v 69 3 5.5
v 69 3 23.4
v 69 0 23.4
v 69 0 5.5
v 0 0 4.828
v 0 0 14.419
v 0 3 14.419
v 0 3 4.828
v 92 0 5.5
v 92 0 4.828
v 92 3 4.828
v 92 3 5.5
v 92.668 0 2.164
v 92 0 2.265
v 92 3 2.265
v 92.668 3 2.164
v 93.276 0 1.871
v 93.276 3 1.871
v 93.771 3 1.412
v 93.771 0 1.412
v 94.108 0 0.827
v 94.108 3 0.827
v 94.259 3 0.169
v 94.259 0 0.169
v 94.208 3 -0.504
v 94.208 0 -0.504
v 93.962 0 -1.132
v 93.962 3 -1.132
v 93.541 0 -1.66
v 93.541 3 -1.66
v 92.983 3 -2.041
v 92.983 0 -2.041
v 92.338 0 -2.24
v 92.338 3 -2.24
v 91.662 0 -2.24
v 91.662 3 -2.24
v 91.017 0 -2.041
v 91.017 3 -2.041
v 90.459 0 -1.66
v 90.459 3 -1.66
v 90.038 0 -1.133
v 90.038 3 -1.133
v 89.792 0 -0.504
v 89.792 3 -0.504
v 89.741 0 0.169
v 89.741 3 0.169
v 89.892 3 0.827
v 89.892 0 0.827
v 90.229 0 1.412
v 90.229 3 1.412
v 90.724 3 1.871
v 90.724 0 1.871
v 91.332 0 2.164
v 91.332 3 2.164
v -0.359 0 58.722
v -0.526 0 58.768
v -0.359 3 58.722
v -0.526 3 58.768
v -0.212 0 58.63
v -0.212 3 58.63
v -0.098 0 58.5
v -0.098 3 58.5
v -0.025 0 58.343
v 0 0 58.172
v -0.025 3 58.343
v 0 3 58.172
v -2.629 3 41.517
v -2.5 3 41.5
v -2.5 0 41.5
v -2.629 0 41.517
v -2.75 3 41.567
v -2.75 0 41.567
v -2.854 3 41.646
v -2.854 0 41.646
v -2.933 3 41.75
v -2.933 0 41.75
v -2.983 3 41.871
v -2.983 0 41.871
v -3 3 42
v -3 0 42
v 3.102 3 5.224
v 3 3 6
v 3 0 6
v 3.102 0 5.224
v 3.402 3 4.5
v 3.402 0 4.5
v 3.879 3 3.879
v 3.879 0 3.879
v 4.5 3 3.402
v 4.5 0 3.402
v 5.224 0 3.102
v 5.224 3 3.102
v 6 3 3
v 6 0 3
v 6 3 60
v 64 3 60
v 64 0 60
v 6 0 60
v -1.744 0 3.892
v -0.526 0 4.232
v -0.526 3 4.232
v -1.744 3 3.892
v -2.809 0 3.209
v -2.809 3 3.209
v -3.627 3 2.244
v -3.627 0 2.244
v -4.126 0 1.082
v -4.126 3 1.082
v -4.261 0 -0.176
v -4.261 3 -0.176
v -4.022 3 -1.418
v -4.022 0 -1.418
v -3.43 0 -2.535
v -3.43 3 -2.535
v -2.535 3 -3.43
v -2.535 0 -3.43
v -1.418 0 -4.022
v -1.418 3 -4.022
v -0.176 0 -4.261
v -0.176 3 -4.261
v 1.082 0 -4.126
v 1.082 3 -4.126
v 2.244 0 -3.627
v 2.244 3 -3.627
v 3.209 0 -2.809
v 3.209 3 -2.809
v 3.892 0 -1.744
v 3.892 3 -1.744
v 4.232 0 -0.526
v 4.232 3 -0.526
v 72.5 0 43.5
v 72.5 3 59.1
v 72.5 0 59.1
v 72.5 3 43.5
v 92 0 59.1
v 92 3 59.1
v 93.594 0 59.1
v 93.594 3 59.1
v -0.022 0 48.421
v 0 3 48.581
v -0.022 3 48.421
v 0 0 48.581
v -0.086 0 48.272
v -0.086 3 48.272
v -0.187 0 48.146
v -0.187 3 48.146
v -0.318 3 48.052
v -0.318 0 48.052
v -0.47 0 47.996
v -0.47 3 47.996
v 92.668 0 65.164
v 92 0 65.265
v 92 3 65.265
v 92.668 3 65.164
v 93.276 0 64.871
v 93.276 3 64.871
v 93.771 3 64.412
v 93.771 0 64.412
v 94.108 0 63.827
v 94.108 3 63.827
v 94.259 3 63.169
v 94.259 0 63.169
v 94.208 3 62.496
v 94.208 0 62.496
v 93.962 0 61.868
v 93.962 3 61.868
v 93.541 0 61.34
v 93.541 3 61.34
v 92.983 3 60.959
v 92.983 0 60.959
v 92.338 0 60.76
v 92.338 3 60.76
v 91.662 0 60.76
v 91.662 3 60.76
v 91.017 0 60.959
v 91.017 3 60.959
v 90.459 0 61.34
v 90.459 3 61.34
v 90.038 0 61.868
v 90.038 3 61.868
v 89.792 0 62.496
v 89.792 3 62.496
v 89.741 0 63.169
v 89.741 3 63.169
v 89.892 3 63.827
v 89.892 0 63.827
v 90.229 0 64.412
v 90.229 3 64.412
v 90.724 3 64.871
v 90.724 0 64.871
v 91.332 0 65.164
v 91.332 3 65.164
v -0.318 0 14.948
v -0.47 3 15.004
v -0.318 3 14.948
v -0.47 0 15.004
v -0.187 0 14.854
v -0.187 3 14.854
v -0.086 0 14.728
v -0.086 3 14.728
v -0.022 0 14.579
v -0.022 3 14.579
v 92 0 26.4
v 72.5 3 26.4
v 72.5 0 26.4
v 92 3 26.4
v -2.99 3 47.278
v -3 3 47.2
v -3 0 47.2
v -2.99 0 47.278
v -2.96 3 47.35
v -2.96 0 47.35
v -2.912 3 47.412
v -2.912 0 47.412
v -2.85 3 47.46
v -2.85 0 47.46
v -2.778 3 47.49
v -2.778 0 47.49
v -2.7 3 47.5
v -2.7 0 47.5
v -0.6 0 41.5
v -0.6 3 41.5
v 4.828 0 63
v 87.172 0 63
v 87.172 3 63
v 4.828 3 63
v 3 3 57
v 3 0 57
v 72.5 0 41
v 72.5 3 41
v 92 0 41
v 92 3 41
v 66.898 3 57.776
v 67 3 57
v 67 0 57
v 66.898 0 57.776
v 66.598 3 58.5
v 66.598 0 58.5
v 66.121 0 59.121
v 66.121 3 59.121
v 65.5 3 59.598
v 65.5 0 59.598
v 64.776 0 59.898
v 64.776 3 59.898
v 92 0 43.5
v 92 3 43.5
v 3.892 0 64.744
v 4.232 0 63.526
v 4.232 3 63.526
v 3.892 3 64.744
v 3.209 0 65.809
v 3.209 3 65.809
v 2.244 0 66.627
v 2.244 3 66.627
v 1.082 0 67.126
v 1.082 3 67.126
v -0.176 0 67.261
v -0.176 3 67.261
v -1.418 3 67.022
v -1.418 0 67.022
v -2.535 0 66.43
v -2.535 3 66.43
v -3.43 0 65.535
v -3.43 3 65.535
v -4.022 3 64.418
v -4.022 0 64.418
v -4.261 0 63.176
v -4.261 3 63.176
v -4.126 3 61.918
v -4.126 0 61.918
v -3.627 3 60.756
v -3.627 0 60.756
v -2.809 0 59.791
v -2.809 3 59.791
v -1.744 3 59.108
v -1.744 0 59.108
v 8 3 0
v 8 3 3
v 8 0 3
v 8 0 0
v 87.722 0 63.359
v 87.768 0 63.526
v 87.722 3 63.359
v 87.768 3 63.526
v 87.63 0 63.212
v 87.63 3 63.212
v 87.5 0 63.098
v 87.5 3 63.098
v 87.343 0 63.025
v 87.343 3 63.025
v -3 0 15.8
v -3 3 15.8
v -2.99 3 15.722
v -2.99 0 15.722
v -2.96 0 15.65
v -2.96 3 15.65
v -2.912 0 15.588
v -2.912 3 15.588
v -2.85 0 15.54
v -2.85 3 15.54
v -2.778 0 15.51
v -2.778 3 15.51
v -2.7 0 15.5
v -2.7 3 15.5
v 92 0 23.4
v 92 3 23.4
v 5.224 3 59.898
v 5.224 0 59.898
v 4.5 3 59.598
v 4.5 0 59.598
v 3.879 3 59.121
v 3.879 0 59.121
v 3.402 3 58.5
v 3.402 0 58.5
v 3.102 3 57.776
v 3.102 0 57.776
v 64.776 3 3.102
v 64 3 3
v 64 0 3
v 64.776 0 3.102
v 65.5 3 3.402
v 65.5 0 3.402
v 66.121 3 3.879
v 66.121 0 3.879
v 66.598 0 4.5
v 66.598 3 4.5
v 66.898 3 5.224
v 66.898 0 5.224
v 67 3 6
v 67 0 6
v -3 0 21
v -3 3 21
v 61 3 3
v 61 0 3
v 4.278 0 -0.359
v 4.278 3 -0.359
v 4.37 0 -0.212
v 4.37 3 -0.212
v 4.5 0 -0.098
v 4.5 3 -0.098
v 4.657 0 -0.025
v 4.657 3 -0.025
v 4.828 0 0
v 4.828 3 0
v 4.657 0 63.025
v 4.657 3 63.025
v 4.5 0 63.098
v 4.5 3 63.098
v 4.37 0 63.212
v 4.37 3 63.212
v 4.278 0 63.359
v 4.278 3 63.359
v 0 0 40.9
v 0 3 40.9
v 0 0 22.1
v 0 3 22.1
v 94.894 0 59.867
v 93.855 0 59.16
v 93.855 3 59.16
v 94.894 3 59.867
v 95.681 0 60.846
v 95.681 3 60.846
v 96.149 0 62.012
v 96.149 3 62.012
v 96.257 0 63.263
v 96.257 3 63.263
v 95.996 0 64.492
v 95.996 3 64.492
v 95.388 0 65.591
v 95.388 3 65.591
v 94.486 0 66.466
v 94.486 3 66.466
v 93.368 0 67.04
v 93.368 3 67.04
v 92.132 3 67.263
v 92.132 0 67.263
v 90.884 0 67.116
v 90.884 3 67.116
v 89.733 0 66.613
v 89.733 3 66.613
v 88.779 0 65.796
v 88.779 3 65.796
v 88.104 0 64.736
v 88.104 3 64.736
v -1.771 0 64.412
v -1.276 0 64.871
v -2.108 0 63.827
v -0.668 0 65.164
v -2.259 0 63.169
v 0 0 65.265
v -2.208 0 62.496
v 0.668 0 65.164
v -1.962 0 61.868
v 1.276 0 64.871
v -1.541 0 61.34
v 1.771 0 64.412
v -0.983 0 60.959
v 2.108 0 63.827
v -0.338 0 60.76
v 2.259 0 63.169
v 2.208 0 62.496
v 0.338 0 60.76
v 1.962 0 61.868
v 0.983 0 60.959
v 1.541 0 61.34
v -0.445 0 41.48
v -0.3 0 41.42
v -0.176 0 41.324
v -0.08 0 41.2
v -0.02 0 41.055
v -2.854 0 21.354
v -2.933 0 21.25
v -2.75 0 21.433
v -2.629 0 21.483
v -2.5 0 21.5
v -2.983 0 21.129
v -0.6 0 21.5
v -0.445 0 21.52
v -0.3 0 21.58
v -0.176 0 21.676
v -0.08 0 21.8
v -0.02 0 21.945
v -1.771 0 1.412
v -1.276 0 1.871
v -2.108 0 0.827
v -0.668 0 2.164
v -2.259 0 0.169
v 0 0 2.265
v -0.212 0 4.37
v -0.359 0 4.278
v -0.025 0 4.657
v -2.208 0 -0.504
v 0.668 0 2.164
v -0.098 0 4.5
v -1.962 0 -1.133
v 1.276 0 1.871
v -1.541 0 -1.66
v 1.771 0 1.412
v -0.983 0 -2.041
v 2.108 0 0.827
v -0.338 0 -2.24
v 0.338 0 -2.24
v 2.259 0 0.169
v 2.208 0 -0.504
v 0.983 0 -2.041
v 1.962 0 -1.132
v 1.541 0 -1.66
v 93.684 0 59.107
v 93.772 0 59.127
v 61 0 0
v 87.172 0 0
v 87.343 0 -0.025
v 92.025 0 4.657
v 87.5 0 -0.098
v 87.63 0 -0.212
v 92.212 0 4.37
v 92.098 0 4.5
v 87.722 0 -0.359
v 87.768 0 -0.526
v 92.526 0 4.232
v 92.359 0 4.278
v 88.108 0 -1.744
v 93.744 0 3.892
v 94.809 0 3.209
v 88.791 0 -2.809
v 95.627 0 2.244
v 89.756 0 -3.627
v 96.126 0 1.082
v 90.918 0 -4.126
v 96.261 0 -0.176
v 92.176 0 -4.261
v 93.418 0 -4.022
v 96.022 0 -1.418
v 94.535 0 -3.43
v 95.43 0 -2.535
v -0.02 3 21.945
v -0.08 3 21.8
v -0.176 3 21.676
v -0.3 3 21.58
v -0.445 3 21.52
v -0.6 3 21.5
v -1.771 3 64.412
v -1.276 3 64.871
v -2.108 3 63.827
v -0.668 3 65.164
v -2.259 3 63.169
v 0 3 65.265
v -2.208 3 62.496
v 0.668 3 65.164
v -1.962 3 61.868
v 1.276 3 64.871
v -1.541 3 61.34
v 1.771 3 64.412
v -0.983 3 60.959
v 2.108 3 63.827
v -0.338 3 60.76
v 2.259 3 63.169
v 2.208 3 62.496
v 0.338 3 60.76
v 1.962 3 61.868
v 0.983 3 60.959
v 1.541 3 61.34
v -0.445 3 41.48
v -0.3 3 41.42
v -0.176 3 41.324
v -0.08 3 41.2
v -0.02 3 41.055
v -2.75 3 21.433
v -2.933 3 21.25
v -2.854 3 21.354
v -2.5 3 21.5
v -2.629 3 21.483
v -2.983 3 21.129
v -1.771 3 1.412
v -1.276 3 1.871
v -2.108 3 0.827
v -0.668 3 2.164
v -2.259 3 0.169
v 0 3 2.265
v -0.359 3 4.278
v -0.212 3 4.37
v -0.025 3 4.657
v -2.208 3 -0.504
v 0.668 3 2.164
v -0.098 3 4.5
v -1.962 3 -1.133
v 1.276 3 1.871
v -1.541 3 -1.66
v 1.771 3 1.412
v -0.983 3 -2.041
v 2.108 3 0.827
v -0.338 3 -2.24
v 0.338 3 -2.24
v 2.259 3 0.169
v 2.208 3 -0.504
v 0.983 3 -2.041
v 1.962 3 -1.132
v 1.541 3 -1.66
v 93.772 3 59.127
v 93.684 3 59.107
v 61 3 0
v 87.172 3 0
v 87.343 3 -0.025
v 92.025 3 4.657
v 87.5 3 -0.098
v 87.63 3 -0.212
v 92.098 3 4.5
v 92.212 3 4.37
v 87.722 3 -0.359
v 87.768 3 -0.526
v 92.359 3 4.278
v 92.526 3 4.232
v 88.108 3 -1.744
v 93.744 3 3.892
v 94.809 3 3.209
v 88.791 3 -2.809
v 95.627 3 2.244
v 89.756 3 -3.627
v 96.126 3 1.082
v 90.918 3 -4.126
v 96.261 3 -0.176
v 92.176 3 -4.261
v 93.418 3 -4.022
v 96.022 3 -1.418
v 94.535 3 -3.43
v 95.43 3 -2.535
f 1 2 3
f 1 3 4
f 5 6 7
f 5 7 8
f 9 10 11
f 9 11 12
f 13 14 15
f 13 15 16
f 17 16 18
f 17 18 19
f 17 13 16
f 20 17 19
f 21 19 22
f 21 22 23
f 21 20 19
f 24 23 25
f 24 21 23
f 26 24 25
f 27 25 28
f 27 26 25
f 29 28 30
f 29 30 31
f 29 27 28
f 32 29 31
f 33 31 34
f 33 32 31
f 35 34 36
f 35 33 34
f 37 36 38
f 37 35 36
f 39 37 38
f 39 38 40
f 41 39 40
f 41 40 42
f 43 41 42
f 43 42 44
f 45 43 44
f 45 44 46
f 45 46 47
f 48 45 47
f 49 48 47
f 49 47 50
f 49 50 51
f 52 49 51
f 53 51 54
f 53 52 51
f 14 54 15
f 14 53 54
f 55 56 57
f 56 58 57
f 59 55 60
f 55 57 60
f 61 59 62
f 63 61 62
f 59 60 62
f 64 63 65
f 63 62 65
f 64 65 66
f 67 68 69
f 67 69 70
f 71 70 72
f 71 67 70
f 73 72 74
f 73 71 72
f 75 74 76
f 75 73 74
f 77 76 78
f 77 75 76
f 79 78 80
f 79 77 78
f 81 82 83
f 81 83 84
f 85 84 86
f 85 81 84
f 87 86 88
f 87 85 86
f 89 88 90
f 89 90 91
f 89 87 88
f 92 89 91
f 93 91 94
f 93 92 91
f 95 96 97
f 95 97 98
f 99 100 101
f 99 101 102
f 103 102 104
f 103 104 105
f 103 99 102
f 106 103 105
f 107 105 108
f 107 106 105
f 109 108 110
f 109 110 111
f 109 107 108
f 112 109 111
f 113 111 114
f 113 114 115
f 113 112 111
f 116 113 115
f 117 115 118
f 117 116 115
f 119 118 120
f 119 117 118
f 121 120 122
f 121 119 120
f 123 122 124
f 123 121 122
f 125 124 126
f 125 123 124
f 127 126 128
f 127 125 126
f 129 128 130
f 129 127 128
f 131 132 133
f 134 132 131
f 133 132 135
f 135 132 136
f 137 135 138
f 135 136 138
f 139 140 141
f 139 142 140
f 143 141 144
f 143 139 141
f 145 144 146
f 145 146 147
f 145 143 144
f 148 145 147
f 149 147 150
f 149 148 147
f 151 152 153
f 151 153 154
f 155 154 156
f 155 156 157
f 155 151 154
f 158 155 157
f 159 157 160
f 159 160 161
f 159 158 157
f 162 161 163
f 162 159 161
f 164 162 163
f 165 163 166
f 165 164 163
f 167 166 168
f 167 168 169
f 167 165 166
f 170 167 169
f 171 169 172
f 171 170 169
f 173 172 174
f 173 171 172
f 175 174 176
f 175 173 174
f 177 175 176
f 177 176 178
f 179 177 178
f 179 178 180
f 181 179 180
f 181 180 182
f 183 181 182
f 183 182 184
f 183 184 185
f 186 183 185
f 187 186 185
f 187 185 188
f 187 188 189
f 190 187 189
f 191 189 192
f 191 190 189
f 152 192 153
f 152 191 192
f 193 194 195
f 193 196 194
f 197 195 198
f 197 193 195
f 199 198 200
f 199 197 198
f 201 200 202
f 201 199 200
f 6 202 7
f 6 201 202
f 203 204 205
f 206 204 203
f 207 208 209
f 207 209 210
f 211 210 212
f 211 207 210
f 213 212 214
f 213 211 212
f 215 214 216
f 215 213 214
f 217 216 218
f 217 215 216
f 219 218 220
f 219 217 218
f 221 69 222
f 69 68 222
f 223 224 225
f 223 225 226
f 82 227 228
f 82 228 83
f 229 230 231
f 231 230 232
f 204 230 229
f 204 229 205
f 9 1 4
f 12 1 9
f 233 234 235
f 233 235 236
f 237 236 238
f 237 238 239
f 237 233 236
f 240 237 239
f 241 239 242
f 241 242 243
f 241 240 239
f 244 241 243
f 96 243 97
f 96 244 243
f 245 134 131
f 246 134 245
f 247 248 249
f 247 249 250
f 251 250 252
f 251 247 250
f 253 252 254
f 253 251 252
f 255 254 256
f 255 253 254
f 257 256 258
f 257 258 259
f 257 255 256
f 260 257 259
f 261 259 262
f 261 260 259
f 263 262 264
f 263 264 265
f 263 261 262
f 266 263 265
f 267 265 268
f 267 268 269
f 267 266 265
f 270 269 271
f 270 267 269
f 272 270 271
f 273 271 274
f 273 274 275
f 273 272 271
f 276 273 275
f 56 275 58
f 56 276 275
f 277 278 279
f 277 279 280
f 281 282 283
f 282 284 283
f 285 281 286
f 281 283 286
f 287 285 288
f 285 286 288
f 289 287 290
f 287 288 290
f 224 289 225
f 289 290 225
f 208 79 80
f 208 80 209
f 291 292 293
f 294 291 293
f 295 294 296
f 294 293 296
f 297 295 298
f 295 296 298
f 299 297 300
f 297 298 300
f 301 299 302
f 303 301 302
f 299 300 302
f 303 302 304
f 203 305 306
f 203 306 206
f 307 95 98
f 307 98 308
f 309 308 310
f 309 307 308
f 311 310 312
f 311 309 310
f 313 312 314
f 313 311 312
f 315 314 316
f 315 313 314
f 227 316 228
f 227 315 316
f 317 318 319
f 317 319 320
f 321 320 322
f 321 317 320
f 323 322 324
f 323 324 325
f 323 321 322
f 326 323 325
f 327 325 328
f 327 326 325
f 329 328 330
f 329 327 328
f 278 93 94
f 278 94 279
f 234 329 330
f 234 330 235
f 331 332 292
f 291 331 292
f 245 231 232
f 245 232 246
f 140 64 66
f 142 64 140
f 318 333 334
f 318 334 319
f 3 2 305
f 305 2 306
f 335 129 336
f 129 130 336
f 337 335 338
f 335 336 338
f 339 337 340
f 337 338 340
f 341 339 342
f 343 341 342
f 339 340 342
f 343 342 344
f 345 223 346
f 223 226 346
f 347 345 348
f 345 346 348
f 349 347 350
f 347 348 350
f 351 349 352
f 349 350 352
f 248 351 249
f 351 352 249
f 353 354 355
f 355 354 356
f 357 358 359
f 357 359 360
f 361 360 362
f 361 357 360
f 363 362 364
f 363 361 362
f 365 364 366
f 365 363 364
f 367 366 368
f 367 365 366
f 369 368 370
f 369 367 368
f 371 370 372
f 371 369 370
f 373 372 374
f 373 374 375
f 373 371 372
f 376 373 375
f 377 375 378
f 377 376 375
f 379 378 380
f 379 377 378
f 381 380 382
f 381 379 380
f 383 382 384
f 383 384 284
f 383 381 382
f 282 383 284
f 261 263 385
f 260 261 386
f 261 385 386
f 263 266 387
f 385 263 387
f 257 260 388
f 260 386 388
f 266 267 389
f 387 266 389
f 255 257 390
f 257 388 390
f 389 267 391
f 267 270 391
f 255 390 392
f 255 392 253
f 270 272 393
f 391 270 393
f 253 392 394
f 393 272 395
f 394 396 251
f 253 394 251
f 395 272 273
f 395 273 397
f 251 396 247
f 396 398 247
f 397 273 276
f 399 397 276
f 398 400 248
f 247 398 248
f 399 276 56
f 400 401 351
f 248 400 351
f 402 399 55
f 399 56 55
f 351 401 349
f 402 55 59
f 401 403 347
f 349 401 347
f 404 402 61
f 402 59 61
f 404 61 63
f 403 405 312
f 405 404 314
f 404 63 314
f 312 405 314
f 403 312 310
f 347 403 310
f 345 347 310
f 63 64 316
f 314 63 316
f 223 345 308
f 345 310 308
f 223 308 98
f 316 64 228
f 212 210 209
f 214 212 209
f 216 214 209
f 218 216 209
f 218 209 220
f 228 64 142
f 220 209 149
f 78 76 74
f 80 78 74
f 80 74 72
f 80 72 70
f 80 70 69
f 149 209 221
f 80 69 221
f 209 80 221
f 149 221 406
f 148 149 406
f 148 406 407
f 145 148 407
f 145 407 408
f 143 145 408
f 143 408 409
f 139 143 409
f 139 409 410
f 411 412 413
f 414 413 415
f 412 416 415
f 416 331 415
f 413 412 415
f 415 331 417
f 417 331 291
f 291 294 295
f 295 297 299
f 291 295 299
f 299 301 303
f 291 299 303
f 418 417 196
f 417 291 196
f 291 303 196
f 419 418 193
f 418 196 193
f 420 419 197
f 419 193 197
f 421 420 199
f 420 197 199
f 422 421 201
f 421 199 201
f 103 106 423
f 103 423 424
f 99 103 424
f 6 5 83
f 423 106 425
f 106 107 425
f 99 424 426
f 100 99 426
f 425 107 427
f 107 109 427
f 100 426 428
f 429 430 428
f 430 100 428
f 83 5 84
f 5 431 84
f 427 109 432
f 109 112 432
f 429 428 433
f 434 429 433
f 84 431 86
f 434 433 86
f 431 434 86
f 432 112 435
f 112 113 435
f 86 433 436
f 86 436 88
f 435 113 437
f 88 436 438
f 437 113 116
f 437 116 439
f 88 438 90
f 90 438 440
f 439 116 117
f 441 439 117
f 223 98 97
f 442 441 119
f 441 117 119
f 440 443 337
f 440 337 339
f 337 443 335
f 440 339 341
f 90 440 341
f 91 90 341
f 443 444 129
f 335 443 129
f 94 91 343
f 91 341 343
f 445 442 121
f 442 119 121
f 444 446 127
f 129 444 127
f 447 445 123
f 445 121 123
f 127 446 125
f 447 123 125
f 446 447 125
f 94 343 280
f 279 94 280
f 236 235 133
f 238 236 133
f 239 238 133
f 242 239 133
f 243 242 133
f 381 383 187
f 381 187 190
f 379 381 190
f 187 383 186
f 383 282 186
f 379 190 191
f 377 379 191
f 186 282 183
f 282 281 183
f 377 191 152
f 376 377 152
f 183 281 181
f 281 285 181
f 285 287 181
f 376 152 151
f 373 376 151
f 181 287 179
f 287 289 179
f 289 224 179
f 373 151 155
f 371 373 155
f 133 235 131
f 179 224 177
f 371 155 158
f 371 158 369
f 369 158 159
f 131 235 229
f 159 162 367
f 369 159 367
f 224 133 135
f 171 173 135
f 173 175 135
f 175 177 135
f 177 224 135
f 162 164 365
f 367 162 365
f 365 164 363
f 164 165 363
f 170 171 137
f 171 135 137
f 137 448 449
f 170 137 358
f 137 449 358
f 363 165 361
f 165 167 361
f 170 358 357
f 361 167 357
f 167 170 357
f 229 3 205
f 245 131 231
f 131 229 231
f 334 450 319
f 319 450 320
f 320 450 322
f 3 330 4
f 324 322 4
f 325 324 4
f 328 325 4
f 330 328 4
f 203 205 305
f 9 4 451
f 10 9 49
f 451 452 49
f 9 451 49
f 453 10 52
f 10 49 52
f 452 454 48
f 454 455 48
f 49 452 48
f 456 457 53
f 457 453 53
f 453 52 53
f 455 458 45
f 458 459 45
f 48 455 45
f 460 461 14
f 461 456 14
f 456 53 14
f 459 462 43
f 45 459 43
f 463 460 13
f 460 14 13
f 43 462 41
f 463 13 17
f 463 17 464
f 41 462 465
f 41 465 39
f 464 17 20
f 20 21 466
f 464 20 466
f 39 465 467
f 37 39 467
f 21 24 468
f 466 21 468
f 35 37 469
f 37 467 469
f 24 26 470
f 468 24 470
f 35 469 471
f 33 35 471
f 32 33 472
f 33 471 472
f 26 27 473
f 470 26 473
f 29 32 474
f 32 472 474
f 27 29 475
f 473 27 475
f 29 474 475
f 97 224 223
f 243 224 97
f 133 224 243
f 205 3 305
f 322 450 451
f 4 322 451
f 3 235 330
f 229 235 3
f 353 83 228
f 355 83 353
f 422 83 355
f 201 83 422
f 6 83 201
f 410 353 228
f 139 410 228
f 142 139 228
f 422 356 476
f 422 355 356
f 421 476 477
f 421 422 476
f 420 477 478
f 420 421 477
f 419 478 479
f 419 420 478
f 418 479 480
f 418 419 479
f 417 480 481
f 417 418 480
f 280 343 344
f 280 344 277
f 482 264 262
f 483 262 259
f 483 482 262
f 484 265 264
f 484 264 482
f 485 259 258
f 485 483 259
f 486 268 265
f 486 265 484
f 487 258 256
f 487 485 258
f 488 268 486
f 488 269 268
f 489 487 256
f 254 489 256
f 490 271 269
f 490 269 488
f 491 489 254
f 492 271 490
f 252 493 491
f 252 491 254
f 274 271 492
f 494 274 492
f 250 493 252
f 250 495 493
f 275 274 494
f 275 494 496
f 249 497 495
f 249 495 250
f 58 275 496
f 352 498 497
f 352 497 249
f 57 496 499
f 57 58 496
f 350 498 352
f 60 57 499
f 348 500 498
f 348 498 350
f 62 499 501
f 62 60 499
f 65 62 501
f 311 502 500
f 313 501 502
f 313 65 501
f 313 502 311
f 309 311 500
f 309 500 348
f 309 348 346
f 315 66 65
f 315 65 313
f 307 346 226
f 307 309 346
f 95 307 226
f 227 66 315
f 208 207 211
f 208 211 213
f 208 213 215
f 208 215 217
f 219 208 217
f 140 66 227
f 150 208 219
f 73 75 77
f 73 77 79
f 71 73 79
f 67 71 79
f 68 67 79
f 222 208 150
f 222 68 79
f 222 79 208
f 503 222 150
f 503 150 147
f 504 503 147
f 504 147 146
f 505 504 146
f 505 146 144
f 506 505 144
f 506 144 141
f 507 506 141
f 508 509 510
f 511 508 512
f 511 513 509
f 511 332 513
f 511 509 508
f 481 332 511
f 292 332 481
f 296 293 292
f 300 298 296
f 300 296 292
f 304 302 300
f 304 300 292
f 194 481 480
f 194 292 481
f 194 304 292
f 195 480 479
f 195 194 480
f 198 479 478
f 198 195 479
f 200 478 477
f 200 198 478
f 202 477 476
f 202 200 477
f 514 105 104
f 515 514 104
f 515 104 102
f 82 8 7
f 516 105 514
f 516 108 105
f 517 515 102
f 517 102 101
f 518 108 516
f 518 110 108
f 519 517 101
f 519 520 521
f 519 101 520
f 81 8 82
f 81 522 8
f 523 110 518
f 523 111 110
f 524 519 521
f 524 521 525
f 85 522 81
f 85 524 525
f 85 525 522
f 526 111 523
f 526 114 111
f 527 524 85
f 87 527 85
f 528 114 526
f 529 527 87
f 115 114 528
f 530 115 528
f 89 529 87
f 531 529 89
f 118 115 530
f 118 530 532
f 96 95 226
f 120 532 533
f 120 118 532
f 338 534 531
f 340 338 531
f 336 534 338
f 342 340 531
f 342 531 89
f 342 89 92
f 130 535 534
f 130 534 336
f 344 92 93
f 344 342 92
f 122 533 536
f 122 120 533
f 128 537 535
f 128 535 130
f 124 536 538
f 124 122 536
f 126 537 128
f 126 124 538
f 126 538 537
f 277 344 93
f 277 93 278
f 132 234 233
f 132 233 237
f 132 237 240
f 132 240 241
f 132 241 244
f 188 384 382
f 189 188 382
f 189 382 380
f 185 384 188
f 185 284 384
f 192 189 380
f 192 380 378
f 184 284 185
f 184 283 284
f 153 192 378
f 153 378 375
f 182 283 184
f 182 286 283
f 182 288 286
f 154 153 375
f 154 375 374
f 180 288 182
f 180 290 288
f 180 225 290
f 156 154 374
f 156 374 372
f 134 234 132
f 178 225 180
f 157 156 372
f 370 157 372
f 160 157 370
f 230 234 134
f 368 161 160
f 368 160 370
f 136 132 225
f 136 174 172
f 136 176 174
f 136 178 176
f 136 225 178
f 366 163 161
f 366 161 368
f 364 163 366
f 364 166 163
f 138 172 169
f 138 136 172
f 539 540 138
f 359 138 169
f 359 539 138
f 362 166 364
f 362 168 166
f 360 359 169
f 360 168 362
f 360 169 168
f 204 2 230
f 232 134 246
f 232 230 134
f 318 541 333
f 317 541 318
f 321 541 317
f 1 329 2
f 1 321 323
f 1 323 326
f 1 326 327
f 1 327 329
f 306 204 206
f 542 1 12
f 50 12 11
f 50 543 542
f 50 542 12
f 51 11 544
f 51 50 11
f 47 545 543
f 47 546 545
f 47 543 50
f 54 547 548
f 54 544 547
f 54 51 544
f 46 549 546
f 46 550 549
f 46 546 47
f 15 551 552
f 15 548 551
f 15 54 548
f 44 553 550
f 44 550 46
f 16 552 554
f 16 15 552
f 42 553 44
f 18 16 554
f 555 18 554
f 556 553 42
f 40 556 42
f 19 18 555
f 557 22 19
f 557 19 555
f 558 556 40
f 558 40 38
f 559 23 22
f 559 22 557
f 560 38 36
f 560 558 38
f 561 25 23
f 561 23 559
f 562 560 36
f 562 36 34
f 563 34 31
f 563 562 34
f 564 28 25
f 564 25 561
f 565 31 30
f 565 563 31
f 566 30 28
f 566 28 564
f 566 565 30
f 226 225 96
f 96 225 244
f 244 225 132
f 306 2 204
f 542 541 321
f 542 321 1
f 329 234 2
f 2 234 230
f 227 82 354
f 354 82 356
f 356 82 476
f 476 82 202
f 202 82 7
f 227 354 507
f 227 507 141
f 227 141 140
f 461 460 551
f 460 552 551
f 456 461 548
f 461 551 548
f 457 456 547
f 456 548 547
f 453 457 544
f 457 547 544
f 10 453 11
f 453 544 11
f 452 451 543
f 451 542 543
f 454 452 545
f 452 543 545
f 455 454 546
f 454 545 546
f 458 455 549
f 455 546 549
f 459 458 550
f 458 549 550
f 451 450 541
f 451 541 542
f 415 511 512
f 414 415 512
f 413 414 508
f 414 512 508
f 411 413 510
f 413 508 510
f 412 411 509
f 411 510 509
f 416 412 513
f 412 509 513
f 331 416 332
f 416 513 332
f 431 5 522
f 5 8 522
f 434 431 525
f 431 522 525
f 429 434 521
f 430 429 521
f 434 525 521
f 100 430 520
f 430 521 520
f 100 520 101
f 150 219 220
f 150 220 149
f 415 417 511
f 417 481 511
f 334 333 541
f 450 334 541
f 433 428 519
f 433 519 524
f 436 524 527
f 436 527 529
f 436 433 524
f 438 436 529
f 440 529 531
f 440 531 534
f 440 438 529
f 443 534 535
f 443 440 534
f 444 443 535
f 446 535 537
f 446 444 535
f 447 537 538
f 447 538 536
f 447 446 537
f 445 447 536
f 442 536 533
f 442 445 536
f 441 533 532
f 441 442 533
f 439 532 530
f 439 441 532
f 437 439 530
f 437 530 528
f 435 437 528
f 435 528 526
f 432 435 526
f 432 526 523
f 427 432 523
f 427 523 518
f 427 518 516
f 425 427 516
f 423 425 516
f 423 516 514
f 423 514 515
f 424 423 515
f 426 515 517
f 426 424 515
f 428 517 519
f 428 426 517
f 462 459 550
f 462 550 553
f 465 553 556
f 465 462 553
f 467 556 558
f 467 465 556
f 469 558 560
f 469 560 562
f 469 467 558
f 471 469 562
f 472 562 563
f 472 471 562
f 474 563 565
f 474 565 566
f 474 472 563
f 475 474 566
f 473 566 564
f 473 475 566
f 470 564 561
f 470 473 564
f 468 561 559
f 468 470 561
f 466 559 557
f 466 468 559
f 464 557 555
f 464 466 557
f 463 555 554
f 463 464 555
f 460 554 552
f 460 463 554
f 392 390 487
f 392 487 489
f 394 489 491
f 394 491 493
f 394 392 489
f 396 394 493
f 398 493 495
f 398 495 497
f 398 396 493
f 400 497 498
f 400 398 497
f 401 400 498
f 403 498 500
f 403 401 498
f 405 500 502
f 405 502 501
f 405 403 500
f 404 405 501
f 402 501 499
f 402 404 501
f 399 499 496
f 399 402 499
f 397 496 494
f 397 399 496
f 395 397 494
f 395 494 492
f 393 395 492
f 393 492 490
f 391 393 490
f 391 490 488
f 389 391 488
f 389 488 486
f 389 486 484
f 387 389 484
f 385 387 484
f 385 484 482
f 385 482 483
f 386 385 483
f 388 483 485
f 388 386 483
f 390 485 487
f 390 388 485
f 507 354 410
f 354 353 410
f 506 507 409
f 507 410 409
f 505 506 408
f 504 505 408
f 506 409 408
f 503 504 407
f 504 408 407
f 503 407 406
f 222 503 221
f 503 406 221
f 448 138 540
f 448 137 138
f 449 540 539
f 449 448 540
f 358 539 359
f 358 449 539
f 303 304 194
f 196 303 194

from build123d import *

# Parameters (mm, degrees)
SKETCH1_R           = 2.265
BOSS_EXTRUDE1_DEPTH = 3
SKETCH2_W           = 6.5
SKETCH2_H           = 20
CUT_EXTRUDE1_DEPTH  = 3
BOSS_EXTRUDE2_DEPTH = 3
CUT_EXTRUDE2_DEPTH  = 3
SKETCH5_W           = 3
SKETCH5_H           = 20
BOSS_EXTRUDE3_DEPTH = 3
SKETCH6_W           = 27.010134686
SKETCH6_H           = 17.9
CUT_EXTRUDE3_DEPTH  = 3
SKETCH7_W           = 19.5
SKETCH7_H           = 14.6
CUT_EXTRUDE4_DEPTH  = 3
SKETCH8_W           = 19.5
SKETCH8_H           = 15.6
CUT_EXTRUDE5_DEPTH  = 3
SKETCH9_W           = 2.019620965
SKETCH9_H           = 0.574286347
CUT_EXTRUDE6_DEPTH  = 3
FILLET1_R           = 0.6
SKETCH10_W          = 53
SKETCH10_H          = 3
CUT_EXTRUDE7_DEPTH  = 10


with BuildPart() as part:
    # Sketch1 → Boss-Extrude1 (new body)
    with BuildSketch(Plane(origin=(0, 0, 0), x_dir=(1, 0, 0), z_dir=(0, 1, 0))):
        with BuildLine():
            Line((4.265, 0), (87.735, 0))
            ThreePointArc((87.735, 0), (95.015810422, 3.015810422), (92, -4.265))
            Line((92, -4.265), (92, -58.735))
            ThreePointArc((92, -58.735), (95.015810422, -66.015810422), (87.735, -63))
            Line((87.735, -63), (4.265, -63))
            ThreePointArc((4.265, -63), (-3.015810422, -66.015810422), (0, -58.735))
            Line((0, -58.735), (0, -4.265))
            ThreePointArc((0, -4.265), (-3.015810422, 3.015810422), (4.265, 0))
        make_face()
        with Locations(Location((0, 0, 0), (0, 0, 270))):
            Circle(SKETCH1_R, mode=Mode.SUBTRACT)
        with Locations(Location((92, 0, 0), (0, 0, 270))):
            Circle(SKETCH1_R, mode=Mode.SUBTRACT)
        with Locations(Location((92, -63, 0), (0, 0, 270))):
            Circle(SKETCH1_R, mode=Mode.SUBTRACT)
        with Locations(Location((0, -63, 0), (0, 0, 270))):
            Circle(SKETCH1_R, mode=Mode.SUBTRACT)
    extrude(amount=BOSS_EXTRUDE1_DEPTH)

    # Sketch2 → Cut-Extrude1 (cut)
    with BuildSketch(Plane(origin=(0, 3, 0), x_dir=(1, 0, 0), z_dir=(0, 1, 0))):
        with Locations((3.25, -31.5)):
            Rectangle(SKETCH2_W, SKETCH2_H)
    extrude(amount=-CUT_EXTRUDE1_DEPTH, mode=Mode.SUBTRACT)

    # Sketch3 → Boss-Extrude2 (add)
    with BuildSketch(Plane(origin=(0, 3, 0), x_dir=(1, 0, 0), z_dir=(0, 1, 0))):
        with BuildLine():
            Line((-2.7, -15.5), (0, -14.9))
            Line((0, -14.9), (0, -21.5))
            Line((0, -21.5), (-2.5, -21.5))
            ThreePointArc((-2.5, -21.5), (-2.853553391, -21.353553391), (-3, -21))
            Line((-3, -21), (-3, -15.8))
            ThreePointArc((-3, -15.8), (-2.912132034, -15.587867966), (-2.7, -15.5))
        make_face()
        with BuildLine():
            Line((-3, -42), (-3, -47.2))
            ThreePointArc((-3, -47.2), (-2.912132034, -47.412132034), (-2.7, -47.5))
            Line((-2.7, -47.5), (0, -48.1))
            Line((0, -48.1), (0, -41.5))
            Line((0, -41.5), (-2.5, -41.5))
            ThreePointArc((-2.5, -41.5), (-2.853553391, -41.646446609), (-3, -42))
        make_face()
    extrude(amount=-BOSS_EXTRUDE2_DEPTH)

    # Sketch4 → Cut-Extrude2 (cut)
    with BuildSketch(Plane(origin=(0, 3, 0), x_dir=(1, 0, 0), z_dir=(0, 1, 0))):
        with BuildLine():
            Line((6, -3), (64, -3))
            ThreePointArc((64, -3), (66.121320344, -3.878679656), (67, -6))
            Line((67, -6), (67, -57))
            ThreePointArc((67, -57), (66.121320344, -59.121320344), (64, -60))
            Line((64, -60), (6, -60))
            ThreePointArc((6, -60), (3.878679656, -59.121320344), (3, -57))
            Line((3, -57), (3, -6))
            ThreePointArc((3, -6), (3.878679656, -3.878679656), (6, -3))
        make_face()
    extrude(amount=-CUT_EXTRUDE2_DEPTH, mode=Mode.SUBTRACT)

    # Sketch5 → Boss-Extrude3 (add)
    with BuildSketch(Plane(origin=(0, 3, 0), x_dir=(1, 0, 0), z_dir=(0, 1, 0))):
        with Locations((1.5, -31.5)):
            Rectangle(SKETCH5_W, SKETCH5_H)
    extrude(amount=-BOSS_EXTRUDE3_DEPTH)

    # Sketch6 → Cut-Extrude3 (cut)
    with BuildSketch(Plane(origin=(0, 3, 0), x_dir=(1, 0, 0), z_dir=(0, 1, 0))):
        with Locations((82.505067343, -14.45)):
            Rectangle(SKETCH6_W, SKETCH6_H)
    extrude(amount=-CUT_EXTRUDE3_DEPTH, mode=Mode.SUBTRACT)

    # Sketch7 → Cut-Extrude4 (cut)
    with BuildSketch(Plane(origin=(0, 3, 0), x_dir=(1, 0, 0), z_dir=(0, 1, 0))):
        with Locations((82.25, -33.7)):
            Rectangle(SKETCH7_W, SKETCH7_H)
    extrude(amount=-CUT_EXTRUDE4_DEPTH, mode=Mode.SUBTRACT)

    # Sketch8 → Cut-Extrude5 (cut)
    with BuildSketch(Plane(origin=(0, 3, 0), x_dir=(1, 0, 0), z_dir=(0, 1, 0))):
        with Locations((82.25, -51.3)):
            Rectangle(SKETCH8_W, SKETCH8_H)
    extrude(amount=-CUT_EXTRUDE5_DEPTH, mode=Mode.SUBTRACT)

    # Sketch9 → Cut-Extrude6 (cut)
    with BuildSketch(Plane(origin=(0, 3, 0), x_dir=(1, 0, 0), z_dir=(0, 1, 0))):
        with Locations((93.009810483, -58.812856827)):
            Rectangle(SKETCH9_W, SKETCH9_H)
    extrude(amount=-CUT_EXTRUDE6_DEPTH, mode=Mode.SUBTRACT)

    # Fillet1
    fillet1_edges = [part.edges().sort_by_distance(p)[0] for p in [
        (0, 1.5, 41.5),
        (92, 1.5, 4.265),
        (0, 1.5, 21.5),
        (87.735, 1.5, 63),
        (4.265, 1.5, 63),
        (0, 1.5, 58.735),
        (0, 1.5, 4.265),
        (4.265, 1.5, 0),
        (87.735, 1.5, 0),
        (93.726332818, 1.5, 59.1),
        (0, 1.5, 14.9),
        (0, 1.5, 48.1),
    ]]
    fillet(fillet1_edges, radius=FILLET1_R)

    # Sketch10 → Cut-Extrude7 (cut)
    with BuildSketch(Plane(origin=(0, 3, 0), x_dir=(1, 0, 0), z_dir=(0, 1, 0))):
        with Locations((34.5, -1.5)):
            Rectangle(SKETCH10_W, SKETCH10_H)
    extrude(amount=-CUT_EXTRUDE7_DEPTH, mode=Mode.SUBTRACT)


solid = part.part
